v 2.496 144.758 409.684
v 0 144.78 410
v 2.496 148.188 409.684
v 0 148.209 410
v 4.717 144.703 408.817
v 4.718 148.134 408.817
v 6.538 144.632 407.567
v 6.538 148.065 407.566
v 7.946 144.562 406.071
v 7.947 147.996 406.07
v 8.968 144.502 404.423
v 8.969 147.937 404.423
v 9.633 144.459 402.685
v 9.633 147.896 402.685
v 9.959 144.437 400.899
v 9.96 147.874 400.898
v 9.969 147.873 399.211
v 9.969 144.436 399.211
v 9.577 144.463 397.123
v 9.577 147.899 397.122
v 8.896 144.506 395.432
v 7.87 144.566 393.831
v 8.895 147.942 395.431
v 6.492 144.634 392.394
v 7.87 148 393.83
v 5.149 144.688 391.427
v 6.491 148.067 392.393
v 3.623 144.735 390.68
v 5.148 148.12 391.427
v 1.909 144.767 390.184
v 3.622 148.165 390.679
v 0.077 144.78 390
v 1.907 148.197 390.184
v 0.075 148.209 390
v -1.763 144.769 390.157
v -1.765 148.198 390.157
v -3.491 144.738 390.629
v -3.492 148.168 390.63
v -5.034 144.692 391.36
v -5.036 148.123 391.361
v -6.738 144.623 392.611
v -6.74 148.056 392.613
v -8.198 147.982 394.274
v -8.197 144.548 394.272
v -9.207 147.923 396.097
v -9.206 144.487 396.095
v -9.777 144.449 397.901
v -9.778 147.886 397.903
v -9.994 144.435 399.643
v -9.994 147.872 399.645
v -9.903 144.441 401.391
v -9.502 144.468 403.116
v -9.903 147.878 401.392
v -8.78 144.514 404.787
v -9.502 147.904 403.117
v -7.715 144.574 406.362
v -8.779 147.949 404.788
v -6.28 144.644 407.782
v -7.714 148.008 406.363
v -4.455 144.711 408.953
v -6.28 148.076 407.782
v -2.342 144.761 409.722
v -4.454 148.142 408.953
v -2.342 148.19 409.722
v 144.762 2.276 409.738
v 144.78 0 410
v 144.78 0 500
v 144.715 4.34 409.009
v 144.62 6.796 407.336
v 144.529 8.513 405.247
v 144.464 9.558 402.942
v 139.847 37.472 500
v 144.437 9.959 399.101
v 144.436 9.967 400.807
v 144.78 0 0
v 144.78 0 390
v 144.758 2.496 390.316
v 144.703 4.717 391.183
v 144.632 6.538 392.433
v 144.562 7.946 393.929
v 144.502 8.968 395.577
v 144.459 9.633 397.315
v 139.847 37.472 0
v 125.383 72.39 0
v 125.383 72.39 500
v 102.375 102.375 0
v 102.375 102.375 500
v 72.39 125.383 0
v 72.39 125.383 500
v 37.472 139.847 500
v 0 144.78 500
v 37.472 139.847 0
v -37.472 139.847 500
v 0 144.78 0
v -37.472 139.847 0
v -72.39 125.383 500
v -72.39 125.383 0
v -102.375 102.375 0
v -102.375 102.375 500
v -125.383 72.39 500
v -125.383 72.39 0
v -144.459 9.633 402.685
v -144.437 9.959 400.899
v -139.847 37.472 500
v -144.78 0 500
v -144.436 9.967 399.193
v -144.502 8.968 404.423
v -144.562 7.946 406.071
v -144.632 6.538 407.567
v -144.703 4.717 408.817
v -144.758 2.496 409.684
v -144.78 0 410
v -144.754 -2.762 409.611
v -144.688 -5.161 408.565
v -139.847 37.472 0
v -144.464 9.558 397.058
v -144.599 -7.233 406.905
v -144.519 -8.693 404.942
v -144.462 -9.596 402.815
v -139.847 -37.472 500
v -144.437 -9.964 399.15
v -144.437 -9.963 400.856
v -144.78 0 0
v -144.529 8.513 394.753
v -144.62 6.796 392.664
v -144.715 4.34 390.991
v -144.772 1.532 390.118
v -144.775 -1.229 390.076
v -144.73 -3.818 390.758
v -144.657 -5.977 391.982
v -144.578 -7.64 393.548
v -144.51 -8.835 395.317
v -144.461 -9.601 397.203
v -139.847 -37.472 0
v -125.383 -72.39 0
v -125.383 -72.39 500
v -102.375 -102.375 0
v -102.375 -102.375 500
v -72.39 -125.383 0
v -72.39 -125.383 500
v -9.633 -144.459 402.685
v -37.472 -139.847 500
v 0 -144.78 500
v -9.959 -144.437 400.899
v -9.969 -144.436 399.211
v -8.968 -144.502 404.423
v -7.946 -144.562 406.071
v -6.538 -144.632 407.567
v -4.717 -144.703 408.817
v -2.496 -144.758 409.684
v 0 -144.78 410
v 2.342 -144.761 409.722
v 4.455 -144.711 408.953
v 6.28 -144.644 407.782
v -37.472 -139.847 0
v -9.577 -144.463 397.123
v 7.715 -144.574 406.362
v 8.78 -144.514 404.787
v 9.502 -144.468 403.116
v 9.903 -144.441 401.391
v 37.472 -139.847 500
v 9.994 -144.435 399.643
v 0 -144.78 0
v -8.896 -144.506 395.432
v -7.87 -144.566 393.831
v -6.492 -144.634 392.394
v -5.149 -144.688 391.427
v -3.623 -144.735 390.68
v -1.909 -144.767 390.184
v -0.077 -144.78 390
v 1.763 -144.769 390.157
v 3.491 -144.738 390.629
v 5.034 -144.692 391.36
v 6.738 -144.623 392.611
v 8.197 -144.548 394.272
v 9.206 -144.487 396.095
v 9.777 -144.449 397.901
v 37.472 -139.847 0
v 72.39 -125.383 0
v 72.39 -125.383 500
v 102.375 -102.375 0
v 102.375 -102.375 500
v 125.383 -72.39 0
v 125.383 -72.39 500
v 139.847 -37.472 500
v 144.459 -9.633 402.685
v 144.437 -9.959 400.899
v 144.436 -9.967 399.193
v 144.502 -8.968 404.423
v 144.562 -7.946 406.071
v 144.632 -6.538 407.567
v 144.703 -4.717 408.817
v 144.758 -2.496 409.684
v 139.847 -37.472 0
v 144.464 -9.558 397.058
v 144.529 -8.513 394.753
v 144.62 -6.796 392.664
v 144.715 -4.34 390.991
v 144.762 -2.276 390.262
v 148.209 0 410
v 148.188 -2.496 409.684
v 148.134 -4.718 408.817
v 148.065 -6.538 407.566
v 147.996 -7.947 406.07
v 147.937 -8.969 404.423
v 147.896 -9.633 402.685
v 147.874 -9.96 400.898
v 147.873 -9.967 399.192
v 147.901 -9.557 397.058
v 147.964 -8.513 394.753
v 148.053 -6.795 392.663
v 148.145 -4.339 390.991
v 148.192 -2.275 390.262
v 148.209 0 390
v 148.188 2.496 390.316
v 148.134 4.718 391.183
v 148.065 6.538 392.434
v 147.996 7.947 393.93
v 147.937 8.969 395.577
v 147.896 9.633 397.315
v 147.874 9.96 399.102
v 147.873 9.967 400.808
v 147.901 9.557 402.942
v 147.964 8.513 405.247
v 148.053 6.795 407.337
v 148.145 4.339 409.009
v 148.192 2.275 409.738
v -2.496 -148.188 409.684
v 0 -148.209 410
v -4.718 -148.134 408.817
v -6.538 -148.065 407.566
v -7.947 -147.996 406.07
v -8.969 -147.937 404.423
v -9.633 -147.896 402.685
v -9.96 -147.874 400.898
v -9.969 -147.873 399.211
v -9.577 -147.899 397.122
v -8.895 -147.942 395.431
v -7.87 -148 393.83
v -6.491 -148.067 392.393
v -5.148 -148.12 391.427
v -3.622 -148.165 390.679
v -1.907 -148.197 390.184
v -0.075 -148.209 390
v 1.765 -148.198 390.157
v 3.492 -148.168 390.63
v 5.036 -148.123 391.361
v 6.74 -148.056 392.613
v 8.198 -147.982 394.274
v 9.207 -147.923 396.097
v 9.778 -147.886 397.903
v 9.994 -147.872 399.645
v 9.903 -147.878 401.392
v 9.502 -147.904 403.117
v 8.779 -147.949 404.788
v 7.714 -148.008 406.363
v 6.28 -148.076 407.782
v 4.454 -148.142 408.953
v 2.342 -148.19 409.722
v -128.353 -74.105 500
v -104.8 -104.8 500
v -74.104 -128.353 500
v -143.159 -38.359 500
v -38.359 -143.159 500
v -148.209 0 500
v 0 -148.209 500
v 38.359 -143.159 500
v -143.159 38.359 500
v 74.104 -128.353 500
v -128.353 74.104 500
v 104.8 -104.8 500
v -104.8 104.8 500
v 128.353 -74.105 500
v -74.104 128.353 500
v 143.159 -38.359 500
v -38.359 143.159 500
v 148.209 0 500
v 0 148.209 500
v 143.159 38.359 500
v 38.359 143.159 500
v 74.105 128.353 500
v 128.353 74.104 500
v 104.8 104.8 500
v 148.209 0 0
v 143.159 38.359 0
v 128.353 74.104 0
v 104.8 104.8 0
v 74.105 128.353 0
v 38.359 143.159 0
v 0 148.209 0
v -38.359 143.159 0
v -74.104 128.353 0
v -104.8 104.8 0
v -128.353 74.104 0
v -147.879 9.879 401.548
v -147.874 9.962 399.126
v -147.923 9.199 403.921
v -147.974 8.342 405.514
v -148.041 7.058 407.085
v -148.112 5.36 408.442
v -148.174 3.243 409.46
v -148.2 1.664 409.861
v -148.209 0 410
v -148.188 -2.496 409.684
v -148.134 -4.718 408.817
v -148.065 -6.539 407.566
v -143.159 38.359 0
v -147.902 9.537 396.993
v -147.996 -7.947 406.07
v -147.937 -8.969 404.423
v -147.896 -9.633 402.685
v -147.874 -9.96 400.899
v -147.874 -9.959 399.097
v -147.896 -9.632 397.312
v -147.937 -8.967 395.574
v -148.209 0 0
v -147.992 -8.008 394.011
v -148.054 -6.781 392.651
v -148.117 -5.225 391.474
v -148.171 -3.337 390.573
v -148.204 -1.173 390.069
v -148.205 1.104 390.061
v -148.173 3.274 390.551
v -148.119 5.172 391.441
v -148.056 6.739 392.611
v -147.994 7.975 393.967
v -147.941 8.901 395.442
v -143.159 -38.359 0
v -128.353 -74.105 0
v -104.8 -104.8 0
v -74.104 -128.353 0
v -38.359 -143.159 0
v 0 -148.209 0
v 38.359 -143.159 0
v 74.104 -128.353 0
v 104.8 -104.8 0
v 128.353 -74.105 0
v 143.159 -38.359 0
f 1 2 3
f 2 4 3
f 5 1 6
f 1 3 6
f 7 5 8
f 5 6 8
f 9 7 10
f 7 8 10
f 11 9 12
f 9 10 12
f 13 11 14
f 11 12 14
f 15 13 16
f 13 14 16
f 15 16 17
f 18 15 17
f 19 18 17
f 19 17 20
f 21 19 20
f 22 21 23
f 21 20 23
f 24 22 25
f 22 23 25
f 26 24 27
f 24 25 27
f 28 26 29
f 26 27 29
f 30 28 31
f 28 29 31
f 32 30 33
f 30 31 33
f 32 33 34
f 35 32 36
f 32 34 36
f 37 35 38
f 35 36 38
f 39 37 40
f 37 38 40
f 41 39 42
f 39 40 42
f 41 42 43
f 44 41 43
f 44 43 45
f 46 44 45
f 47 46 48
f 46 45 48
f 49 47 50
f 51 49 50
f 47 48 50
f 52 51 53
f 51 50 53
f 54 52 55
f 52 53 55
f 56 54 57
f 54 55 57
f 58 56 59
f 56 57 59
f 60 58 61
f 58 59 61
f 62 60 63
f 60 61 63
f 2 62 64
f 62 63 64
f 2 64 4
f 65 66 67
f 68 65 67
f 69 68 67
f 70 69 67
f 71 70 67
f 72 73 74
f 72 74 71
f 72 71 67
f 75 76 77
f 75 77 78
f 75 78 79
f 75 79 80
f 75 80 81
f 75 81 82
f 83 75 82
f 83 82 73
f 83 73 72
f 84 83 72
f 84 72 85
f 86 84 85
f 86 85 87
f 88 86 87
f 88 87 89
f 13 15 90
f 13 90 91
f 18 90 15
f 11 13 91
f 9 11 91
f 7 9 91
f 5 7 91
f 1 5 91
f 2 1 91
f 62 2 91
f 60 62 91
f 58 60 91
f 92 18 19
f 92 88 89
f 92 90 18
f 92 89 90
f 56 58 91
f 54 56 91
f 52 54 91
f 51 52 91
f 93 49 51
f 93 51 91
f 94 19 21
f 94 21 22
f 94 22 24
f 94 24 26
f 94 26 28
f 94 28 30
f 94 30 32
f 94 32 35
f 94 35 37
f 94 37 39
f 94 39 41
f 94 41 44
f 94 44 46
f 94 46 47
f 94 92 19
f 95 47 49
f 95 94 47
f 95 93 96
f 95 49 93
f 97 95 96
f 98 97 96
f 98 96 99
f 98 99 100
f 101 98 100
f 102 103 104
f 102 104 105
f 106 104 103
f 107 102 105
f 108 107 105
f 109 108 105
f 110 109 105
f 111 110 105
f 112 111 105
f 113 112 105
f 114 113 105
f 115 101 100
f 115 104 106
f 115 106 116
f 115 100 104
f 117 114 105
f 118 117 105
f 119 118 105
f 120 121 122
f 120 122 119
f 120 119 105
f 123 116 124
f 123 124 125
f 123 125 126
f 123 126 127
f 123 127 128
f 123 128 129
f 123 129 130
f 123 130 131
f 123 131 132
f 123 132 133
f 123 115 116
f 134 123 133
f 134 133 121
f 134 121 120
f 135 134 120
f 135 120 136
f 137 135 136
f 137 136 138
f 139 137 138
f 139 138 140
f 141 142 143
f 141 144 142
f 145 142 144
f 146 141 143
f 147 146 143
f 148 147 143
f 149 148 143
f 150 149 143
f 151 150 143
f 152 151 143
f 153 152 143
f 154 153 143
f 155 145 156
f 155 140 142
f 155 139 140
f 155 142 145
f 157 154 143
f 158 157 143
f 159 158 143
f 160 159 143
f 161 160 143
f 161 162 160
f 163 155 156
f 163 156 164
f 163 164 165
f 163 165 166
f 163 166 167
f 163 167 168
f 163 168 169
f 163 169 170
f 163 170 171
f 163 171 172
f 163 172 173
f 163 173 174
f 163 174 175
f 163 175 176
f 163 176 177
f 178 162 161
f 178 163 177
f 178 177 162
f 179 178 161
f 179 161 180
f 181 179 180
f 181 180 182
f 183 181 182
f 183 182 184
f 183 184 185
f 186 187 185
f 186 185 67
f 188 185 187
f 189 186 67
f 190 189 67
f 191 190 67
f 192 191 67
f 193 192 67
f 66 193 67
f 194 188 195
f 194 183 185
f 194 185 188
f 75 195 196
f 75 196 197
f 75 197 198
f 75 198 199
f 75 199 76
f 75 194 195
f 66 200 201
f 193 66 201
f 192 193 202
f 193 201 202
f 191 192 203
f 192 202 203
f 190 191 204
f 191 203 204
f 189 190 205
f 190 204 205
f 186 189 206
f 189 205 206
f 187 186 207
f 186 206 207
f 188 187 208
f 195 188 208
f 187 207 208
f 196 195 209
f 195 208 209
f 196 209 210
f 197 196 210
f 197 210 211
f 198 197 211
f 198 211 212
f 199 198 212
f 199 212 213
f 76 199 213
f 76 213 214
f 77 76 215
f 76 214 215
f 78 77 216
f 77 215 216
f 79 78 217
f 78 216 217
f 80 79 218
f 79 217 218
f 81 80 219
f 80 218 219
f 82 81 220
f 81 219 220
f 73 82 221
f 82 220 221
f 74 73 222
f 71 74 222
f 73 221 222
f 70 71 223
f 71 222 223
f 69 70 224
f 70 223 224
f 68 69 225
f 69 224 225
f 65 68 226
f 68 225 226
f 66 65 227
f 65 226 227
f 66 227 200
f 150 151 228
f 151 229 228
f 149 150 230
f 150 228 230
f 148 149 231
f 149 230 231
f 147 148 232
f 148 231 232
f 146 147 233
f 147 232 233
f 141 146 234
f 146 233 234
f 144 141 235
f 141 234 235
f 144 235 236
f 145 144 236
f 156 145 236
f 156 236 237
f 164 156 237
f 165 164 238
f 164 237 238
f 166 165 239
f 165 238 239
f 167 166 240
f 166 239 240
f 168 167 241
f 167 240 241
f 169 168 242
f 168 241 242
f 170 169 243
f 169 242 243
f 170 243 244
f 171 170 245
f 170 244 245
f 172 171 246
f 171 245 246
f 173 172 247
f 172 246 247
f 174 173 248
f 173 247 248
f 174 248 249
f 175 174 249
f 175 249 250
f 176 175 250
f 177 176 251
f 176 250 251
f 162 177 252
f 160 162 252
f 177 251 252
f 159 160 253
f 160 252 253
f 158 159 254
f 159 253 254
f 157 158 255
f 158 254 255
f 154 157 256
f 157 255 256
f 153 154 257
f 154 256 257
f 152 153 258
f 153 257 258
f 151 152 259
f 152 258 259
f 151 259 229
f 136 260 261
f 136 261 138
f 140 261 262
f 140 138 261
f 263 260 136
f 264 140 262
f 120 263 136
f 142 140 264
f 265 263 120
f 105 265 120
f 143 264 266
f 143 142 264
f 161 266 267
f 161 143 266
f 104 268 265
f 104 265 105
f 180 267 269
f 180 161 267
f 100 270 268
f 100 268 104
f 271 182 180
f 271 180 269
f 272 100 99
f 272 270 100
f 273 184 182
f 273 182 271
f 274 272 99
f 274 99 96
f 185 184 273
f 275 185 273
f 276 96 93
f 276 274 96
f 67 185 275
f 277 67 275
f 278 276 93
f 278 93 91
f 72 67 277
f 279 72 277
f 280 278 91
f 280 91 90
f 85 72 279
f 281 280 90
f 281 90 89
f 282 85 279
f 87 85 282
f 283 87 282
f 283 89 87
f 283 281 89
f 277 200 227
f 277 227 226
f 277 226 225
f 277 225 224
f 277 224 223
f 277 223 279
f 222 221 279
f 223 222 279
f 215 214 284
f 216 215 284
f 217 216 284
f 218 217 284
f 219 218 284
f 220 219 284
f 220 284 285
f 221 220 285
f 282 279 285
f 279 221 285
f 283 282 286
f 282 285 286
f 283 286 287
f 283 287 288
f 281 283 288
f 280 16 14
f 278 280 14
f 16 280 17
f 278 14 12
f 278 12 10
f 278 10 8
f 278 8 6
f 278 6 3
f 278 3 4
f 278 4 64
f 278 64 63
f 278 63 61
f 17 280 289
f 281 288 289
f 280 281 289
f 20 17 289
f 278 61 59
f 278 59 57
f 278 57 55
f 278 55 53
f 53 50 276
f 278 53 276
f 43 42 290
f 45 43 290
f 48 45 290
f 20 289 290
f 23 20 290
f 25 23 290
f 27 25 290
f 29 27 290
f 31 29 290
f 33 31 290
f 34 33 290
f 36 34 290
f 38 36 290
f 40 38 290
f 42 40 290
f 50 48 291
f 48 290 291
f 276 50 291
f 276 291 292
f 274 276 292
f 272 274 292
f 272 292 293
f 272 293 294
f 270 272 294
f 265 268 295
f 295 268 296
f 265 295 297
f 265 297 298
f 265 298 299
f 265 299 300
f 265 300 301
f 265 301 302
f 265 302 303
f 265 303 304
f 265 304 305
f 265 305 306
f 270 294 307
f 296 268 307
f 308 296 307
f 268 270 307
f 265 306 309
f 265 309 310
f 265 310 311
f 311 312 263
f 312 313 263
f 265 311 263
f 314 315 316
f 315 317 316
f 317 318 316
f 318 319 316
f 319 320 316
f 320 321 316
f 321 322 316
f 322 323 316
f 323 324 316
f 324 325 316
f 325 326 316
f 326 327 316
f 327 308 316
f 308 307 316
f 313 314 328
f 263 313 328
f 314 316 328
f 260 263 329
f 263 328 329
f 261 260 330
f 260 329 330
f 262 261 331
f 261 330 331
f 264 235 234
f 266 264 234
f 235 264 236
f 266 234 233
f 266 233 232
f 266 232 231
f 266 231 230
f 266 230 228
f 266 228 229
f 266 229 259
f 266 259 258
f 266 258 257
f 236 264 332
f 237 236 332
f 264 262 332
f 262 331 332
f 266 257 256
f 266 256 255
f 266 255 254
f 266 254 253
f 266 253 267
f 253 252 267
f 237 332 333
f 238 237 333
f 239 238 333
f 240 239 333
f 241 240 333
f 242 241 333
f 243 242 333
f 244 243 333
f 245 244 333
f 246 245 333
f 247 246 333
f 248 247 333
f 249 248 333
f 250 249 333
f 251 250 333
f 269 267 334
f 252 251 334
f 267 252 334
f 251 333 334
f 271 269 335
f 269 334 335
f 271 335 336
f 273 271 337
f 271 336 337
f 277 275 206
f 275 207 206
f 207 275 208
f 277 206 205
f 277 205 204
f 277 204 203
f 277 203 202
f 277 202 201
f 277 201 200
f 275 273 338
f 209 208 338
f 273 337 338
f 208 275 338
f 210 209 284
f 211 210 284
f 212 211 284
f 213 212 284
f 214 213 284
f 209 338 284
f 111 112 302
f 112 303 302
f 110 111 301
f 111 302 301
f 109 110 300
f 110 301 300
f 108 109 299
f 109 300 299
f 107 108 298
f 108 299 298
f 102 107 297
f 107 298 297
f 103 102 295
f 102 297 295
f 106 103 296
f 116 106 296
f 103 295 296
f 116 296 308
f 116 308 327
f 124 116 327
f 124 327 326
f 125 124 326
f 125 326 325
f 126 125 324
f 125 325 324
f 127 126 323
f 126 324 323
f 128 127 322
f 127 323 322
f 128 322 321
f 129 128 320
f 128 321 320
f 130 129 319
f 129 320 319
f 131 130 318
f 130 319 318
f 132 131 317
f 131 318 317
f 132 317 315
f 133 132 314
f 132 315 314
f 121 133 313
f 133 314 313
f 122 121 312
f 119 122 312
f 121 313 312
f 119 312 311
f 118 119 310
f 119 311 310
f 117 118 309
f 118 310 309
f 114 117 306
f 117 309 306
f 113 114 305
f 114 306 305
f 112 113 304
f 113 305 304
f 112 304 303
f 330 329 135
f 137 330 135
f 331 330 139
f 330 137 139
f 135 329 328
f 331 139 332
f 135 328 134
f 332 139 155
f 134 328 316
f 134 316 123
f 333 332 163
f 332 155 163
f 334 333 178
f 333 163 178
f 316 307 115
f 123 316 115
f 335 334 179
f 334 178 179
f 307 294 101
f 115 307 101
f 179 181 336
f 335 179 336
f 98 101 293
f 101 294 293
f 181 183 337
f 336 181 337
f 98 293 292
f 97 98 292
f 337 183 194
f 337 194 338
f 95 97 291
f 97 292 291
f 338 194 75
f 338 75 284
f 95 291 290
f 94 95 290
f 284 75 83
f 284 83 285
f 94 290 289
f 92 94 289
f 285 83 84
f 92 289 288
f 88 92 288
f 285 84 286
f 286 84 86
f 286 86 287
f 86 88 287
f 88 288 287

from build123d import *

# Parameters (mm, degrees)
SKETCH_1_R               = 148.209
SKETCH_1_R_2             = 144.78
EXTRUDE_1_DEPTH          = 500
SKETCH_2_W               = 10
SKETCH_2_H               = 30
PATTERN_CIRCULAR_1_COUNT = 4


with BuildPart() as part:
    # 草圖1 → 填料-伸長1 (new body)
    with BuildSketch(Plane.XY):
        Circle(SKETCH_1_R)
        Circle(SKETCH_1_R_2, mode=Mode.SUBTRACT)
    extrude(amount=EXTRUDE_1_DEPTH)

    # 草圖2 → 除料-旋轉1 (revolve, cut)
    with BuildSketch(Plane(origin=(0, 0, 0), x_dir=(0, 0, -1), z_dir=(1, 0, 0))):
        with Locations((-405, 148.209)):
            Rectangle(SKETCH_2_W, SKETCH_2_H)
    cut_revolve_1 = revolve(axis=Axis((0, 133.209, 400), (0, 1, 0)), mode=Mode.SUBTRACT)

    # 環狀複製排列1: 除料-旋轉1 ×4 about axis
    pattern_circular_1_axis = Axis((0, 0, 500), (0, 0, -1))
    for i in range(1, PATTERN_CIRCULAR_1_COUNT):
        add(cut_revolve_1.rotate(pattern_circular_1_axis, i * 360 / PATTERN_CIRCULAR_1_COUNT), mode=Mode.SUBTRACT)


solid = part.part
